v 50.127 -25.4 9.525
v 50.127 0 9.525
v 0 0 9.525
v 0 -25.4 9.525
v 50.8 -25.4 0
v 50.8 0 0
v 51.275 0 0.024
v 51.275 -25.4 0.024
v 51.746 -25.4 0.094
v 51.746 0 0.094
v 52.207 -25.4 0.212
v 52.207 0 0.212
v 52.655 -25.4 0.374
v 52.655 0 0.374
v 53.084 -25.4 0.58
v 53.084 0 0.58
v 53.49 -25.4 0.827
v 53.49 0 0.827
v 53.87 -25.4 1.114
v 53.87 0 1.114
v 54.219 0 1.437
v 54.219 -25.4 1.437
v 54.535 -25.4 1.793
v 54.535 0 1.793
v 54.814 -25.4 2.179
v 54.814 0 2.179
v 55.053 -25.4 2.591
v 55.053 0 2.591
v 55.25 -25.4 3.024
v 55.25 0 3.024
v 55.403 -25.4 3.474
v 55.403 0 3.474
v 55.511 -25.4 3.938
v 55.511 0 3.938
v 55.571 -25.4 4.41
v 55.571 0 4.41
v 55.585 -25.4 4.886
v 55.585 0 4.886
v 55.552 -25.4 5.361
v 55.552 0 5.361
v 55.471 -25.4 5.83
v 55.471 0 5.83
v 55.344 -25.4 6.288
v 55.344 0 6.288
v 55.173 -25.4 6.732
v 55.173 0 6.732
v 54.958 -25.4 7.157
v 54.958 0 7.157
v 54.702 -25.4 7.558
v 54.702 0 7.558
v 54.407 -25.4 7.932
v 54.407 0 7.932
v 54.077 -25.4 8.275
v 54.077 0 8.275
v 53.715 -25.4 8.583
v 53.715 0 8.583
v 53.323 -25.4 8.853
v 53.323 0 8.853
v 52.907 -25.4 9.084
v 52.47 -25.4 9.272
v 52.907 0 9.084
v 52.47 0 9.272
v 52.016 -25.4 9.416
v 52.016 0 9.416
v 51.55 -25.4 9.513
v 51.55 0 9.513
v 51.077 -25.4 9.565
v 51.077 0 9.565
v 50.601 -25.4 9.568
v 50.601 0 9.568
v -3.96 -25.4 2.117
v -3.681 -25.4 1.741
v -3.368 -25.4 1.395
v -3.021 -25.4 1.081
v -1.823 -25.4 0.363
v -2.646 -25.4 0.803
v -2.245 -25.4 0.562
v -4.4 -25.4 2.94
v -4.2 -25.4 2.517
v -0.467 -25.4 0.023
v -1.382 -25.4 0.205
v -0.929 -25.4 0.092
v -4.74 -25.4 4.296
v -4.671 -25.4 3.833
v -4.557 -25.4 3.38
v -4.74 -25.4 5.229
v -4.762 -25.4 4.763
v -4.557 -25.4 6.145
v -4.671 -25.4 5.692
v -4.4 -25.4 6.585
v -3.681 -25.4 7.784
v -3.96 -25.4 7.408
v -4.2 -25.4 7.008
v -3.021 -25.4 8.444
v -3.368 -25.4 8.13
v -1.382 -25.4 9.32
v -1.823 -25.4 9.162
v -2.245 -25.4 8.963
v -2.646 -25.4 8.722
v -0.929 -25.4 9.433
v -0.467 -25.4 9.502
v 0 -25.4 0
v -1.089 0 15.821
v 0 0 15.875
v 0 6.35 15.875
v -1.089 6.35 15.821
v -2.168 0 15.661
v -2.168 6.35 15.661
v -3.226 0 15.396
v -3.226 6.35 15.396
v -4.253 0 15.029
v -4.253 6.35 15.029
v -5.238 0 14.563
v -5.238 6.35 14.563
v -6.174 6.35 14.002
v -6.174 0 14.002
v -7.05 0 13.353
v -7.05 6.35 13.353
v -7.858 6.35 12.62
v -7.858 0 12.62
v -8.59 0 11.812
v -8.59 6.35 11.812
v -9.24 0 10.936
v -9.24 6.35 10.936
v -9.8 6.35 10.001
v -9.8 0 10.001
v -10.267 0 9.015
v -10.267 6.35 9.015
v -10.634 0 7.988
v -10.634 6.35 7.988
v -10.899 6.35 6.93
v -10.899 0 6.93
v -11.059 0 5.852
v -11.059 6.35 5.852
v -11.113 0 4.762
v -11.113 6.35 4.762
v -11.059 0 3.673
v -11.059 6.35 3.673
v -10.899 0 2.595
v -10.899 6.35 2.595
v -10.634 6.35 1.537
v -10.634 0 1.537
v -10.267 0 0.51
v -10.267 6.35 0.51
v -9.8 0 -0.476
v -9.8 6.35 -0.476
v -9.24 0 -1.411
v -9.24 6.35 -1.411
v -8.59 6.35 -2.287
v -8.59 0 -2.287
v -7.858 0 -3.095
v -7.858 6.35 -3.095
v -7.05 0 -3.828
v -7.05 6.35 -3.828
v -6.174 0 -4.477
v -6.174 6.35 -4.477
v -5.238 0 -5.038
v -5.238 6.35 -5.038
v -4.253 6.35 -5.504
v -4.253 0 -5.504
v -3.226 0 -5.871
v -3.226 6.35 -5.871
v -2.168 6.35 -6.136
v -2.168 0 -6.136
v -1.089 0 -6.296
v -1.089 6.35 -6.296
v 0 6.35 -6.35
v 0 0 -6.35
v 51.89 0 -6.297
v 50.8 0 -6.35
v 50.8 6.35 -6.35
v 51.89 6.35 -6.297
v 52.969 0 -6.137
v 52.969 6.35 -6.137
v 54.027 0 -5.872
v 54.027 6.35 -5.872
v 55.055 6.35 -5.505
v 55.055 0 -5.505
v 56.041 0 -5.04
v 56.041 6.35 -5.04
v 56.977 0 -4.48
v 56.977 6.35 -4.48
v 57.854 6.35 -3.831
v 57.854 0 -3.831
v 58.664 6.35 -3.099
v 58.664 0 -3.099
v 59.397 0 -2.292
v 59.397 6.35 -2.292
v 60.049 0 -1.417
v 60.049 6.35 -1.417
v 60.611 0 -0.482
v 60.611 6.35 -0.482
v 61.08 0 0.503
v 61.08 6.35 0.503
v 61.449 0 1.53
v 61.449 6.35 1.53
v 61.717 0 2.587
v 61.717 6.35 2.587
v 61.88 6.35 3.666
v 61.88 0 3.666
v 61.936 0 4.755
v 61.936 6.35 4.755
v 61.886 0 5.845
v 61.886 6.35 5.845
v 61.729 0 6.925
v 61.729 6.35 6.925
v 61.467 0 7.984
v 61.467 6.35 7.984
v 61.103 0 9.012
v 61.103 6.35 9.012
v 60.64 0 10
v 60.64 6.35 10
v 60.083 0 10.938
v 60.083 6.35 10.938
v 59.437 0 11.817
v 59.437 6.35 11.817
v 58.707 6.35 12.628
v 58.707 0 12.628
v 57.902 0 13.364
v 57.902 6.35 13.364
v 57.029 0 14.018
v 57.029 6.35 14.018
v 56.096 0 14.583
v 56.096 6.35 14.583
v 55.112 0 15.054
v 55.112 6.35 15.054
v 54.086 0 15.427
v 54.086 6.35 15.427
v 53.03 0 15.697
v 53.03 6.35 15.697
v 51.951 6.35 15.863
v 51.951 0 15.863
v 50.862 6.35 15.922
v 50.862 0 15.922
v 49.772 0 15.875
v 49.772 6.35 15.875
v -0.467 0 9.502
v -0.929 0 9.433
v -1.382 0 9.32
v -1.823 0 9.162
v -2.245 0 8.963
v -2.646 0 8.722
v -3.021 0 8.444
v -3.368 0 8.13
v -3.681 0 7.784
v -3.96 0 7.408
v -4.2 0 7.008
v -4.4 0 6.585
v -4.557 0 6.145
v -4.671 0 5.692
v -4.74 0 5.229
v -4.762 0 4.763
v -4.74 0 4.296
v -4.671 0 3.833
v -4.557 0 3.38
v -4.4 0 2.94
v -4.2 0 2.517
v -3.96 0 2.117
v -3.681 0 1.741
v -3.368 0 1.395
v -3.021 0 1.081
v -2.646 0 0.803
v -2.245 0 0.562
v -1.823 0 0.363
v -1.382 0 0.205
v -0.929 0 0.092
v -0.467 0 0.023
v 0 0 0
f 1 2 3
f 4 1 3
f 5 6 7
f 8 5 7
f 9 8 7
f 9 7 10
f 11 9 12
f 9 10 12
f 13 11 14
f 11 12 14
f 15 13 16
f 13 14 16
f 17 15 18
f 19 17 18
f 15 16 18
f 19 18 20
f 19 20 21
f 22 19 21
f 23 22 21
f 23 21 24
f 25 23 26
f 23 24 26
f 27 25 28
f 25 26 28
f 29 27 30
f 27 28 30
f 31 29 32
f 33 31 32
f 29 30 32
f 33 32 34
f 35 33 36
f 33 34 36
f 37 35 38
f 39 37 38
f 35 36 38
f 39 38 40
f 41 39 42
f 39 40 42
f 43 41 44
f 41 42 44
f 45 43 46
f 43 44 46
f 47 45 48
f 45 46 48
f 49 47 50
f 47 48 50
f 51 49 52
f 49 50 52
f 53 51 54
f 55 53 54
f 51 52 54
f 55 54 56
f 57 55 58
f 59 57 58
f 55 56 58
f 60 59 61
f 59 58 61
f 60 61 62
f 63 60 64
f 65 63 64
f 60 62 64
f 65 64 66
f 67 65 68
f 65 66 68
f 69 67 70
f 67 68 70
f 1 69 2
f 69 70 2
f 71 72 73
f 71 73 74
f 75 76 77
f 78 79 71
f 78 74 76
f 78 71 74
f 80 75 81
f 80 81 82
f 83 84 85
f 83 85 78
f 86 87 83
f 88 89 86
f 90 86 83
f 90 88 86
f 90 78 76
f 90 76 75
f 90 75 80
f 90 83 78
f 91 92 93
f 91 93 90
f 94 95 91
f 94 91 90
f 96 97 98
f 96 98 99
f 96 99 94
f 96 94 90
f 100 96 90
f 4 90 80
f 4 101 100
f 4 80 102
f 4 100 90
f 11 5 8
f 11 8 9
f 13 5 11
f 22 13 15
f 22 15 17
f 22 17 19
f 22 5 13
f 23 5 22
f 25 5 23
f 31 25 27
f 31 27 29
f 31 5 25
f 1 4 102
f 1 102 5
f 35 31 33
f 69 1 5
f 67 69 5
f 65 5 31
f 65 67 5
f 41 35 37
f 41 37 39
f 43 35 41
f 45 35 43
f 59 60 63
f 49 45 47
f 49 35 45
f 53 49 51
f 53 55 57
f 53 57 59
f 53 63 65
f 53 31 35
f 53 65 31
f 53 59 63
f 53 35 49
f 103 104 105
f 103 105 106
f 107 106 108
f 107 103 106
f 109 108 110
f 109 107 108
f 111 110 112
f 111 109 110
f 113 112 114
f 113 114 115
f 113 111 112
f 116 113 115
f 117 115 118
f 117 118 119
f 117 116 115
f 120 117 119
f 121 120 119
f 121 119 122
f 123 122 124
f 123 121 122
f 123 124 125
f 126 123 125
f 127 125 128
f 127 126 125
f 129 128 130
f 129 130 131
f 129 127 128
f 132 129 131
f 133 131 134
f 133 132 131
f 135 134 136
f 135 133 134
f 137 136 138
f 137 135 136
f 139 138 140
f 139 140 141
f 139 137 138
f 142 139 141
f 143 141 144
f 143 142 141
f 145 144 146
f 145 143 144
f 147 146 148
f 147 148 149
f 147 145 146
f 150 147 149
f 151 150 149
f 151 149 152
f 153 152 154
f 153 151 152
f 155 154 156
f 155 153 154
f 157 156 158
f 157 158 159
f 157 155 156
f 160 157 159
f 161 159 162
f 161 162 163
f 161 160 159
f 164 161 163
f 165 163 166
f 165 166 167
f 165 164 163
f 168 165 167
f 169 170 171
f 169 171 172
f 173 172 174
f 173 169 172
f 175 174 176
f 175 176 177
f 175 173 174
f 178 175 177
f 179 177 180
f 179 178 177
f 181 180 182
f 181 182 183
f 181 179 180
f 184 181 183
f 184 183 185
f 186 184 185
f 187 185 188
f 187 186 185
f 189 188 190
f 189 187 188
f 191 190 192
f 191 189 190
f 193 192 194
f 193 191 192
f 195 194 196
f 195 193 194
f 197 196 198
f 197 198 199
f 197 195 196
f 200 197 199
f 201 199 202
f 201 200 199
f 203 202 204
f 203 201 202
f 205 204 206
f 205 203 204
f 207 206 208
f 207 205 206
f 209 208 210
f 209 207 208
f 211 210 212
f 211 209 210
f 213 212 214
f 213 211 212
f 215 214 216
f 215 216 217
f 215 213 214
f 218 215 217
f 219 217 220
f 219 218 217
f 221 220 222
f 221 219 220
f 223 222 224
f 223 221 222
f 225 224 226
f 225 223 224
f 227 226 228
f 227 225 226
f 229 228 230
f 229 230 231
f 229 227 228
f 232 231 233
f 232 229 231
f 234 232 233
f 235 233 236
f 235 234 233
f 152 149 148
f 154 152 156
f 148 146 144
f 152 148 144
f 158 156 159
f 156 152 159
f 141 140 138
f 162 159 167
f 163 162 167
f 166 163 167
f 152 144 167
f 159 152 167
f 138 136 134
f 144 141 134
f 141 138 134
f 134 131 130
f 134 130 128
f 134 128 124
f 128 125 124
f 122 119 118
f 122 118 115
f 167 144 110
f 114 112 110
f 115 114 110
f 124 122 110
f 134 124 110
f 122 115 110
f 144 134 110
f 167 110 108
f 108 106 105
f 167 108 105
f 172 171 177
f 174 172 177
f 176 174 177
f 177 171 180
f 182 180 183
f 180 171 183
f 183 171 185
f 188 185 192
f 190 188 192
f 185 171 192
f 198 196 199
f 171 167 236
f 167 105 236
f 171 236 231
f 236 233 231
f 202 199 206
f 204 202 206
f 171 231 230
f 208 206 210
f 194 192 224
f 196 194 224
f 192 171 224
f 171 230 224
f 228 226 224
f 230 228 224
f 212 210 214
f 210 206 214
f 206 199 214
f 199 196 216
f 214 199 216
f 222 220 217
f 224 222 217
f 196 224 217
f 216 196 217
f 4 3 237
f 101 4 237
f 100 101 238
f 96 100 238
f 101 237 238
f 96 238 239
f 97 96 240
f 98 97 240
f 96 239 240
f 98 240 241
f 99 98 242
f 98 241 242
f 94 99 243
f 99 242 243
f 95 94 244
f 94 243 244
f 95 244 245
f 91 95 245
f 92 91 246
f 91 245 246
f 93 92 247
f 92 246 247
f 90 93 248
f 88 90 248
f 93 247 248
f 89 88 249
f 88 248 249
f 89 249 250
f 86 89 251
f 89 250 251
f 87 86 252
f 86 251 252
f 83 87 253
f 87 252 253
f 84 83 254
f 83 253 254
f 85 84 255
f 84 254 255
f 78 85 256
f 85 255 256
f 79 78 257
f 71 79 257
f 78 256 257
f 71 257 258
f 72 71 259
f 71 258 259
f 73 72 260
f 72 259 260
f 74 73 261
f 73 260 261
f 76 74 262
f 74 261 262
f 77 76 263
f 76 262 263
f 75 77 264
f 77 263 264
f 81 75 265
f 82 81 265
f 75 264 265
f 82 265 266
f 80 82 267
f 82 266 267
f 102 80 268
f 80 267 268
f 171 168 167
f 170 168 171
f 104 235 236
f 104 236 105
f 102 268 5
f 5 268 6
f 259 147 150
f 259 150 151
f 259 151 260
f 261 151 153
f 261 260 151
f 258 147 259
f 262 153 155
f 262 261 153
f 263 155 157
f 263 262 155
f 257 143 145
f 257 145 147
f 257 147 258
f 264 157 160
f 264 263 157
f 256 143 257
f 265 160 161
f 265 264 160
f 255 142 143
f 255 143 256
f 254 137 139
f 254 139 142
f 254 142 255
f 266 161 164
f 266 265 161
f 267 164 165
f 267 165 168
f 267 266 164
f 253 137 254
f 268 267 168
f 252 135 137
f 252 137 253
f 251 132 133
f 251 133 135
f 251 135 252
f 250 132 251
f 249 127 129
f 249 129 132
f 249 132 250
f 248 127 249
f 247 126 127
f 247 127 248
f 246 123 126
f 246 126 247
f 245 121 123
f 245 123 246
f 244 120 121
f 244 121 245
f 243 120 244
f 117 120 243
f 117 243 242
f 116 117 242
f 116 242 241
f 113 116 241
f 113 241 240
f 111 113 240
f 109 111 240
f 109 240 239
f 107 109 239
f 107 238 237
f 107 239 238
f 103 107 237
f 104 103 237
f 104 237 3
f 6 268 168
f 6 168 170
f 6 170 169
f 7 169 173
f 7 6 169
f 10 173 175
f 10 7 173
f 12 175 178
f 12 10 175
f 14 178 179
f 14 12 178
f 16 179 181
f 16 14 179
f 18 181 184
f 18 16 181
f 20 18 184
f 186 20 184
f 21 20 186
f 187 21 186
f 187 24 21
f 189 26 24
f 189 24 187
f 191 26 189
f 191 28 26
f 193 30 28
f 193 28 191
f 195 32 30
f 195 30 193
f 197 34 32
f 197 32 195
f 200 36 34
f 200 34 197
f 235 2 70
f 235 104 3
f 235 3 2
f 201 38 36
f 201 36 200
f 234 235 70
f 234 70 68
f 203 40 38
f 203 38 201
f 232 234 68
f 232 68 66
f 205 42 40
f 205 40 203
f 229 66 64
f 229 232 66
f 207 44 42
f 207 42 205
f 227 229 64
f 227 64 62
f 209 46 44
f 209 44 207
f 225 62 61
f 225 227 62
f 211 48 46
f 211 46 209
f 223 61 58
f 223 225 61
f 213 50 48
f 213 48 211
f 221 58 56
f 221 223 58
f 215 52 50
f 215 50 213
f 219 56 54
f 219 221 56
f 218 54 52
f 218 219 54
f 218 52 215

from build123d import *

# Parameters (mm, degrees)
F1_DEPTH = 25.4
F2_DEPTH = 6.35
F3_DEPTH = 6.35


with BuildPart() as f1:
    # F0 (on Front) → F1 (new body)
    with BuildSketch(Plane.XZ):
        with BuildLine():
            ThreePointArc((0, 9.525), (-4.7625, 4.7625), (0, 0))
            Line((0, 0), (50.8, 0))
            ThreePointArc((50.8, 0), (55.574371, 5.123585), (50.127052, 9.525))
            Line((50.127052, 9.525), (0, 9.525))
        make_face()
    extrude(amount=F1_DEPTH)

    # F0 (on Front) → F2 (cut)
    with BuildSketch(Plane.XZ):
        with BuildLine():
            ThreePointArc((0, 15.875), (-11.1125, 4.7625), (0, -6.35))
            Line((0, -6.35), (50.8, -6.35))
            ThreePointArc((50.8, -6.35), (61.92438, 5.300794), (49.772055, 15.875))
            Line((49.772055, 15.875), (0, 15.875))
        make_face()
        with BuildLine():
            Line((50.8, 0), (0, 0))
            ThreePointArc((0, 0), (-4.7625, 4.7625), (0, 9.525))
            Line((0, 9.525), (50.127052, 9.525))
            ThreePointArc((50.127052, 9.525), (55.574371, 5.123585), (50.8, 0))
        make_face(mode=Mode.SUBTRACT)
        with BuildLine():
            ThreePointArc((0, 9.525), (-4.7625, 4.7625), (0, 0))
            Line((0, 0), (50.8, 0))
            ThreePointArc((50.8, 0), (55.574371, 5.123585), (50.127052, 9.525))
            Line((50.127052, 9.525), (0, 9.525))
        make_face()
    extrude(amount=-F2_DEPTH, mode=Mode.SUBTRACT)

    # F0 (on Front) → F3 (join)
    with BuildSketch(Plane.XZ):
        with BuildLine():
            ThreePointArc((0, 15.875), (-11.1125, 4.7625), (0, -6.35))
            Line((0, -6.35), (50.8, -6.35))
            ThreePointArc((50.8, -6.35), (61.92438, 5.300794), (49.772055, 15.875))
            Line((49.772055, 15.875), (0, 15.875))
        make_face()
        with BuildLine():
            Line((50.8, 0), (0, 0))
            ThreePointArc((0, 0), (-4.7625, 4.7625), (0, 9.525))
            Line((0, 9.525), (50.127052, 9.525))
            ThreePointArc((50.127052, 9.525), (55.574371, 5.123585), (50.8, 0))
        make_face(mode=Mode.SUBTRACT)
        with BuildLine():
            ThreePointArc((0, 9.525), (-4.7625, 4.7625), (0, 0))
            Line((0, 0), (50.8, 0))
            ThreePointArc((50.8, 0), (55.574371, 5.123585), (50.127052, 9.525))
            Line((50.127052, 9.525), (0, 9.525))
        make_face()
    extrude(amount=-F3_DEPTH)


solid = f1.part
